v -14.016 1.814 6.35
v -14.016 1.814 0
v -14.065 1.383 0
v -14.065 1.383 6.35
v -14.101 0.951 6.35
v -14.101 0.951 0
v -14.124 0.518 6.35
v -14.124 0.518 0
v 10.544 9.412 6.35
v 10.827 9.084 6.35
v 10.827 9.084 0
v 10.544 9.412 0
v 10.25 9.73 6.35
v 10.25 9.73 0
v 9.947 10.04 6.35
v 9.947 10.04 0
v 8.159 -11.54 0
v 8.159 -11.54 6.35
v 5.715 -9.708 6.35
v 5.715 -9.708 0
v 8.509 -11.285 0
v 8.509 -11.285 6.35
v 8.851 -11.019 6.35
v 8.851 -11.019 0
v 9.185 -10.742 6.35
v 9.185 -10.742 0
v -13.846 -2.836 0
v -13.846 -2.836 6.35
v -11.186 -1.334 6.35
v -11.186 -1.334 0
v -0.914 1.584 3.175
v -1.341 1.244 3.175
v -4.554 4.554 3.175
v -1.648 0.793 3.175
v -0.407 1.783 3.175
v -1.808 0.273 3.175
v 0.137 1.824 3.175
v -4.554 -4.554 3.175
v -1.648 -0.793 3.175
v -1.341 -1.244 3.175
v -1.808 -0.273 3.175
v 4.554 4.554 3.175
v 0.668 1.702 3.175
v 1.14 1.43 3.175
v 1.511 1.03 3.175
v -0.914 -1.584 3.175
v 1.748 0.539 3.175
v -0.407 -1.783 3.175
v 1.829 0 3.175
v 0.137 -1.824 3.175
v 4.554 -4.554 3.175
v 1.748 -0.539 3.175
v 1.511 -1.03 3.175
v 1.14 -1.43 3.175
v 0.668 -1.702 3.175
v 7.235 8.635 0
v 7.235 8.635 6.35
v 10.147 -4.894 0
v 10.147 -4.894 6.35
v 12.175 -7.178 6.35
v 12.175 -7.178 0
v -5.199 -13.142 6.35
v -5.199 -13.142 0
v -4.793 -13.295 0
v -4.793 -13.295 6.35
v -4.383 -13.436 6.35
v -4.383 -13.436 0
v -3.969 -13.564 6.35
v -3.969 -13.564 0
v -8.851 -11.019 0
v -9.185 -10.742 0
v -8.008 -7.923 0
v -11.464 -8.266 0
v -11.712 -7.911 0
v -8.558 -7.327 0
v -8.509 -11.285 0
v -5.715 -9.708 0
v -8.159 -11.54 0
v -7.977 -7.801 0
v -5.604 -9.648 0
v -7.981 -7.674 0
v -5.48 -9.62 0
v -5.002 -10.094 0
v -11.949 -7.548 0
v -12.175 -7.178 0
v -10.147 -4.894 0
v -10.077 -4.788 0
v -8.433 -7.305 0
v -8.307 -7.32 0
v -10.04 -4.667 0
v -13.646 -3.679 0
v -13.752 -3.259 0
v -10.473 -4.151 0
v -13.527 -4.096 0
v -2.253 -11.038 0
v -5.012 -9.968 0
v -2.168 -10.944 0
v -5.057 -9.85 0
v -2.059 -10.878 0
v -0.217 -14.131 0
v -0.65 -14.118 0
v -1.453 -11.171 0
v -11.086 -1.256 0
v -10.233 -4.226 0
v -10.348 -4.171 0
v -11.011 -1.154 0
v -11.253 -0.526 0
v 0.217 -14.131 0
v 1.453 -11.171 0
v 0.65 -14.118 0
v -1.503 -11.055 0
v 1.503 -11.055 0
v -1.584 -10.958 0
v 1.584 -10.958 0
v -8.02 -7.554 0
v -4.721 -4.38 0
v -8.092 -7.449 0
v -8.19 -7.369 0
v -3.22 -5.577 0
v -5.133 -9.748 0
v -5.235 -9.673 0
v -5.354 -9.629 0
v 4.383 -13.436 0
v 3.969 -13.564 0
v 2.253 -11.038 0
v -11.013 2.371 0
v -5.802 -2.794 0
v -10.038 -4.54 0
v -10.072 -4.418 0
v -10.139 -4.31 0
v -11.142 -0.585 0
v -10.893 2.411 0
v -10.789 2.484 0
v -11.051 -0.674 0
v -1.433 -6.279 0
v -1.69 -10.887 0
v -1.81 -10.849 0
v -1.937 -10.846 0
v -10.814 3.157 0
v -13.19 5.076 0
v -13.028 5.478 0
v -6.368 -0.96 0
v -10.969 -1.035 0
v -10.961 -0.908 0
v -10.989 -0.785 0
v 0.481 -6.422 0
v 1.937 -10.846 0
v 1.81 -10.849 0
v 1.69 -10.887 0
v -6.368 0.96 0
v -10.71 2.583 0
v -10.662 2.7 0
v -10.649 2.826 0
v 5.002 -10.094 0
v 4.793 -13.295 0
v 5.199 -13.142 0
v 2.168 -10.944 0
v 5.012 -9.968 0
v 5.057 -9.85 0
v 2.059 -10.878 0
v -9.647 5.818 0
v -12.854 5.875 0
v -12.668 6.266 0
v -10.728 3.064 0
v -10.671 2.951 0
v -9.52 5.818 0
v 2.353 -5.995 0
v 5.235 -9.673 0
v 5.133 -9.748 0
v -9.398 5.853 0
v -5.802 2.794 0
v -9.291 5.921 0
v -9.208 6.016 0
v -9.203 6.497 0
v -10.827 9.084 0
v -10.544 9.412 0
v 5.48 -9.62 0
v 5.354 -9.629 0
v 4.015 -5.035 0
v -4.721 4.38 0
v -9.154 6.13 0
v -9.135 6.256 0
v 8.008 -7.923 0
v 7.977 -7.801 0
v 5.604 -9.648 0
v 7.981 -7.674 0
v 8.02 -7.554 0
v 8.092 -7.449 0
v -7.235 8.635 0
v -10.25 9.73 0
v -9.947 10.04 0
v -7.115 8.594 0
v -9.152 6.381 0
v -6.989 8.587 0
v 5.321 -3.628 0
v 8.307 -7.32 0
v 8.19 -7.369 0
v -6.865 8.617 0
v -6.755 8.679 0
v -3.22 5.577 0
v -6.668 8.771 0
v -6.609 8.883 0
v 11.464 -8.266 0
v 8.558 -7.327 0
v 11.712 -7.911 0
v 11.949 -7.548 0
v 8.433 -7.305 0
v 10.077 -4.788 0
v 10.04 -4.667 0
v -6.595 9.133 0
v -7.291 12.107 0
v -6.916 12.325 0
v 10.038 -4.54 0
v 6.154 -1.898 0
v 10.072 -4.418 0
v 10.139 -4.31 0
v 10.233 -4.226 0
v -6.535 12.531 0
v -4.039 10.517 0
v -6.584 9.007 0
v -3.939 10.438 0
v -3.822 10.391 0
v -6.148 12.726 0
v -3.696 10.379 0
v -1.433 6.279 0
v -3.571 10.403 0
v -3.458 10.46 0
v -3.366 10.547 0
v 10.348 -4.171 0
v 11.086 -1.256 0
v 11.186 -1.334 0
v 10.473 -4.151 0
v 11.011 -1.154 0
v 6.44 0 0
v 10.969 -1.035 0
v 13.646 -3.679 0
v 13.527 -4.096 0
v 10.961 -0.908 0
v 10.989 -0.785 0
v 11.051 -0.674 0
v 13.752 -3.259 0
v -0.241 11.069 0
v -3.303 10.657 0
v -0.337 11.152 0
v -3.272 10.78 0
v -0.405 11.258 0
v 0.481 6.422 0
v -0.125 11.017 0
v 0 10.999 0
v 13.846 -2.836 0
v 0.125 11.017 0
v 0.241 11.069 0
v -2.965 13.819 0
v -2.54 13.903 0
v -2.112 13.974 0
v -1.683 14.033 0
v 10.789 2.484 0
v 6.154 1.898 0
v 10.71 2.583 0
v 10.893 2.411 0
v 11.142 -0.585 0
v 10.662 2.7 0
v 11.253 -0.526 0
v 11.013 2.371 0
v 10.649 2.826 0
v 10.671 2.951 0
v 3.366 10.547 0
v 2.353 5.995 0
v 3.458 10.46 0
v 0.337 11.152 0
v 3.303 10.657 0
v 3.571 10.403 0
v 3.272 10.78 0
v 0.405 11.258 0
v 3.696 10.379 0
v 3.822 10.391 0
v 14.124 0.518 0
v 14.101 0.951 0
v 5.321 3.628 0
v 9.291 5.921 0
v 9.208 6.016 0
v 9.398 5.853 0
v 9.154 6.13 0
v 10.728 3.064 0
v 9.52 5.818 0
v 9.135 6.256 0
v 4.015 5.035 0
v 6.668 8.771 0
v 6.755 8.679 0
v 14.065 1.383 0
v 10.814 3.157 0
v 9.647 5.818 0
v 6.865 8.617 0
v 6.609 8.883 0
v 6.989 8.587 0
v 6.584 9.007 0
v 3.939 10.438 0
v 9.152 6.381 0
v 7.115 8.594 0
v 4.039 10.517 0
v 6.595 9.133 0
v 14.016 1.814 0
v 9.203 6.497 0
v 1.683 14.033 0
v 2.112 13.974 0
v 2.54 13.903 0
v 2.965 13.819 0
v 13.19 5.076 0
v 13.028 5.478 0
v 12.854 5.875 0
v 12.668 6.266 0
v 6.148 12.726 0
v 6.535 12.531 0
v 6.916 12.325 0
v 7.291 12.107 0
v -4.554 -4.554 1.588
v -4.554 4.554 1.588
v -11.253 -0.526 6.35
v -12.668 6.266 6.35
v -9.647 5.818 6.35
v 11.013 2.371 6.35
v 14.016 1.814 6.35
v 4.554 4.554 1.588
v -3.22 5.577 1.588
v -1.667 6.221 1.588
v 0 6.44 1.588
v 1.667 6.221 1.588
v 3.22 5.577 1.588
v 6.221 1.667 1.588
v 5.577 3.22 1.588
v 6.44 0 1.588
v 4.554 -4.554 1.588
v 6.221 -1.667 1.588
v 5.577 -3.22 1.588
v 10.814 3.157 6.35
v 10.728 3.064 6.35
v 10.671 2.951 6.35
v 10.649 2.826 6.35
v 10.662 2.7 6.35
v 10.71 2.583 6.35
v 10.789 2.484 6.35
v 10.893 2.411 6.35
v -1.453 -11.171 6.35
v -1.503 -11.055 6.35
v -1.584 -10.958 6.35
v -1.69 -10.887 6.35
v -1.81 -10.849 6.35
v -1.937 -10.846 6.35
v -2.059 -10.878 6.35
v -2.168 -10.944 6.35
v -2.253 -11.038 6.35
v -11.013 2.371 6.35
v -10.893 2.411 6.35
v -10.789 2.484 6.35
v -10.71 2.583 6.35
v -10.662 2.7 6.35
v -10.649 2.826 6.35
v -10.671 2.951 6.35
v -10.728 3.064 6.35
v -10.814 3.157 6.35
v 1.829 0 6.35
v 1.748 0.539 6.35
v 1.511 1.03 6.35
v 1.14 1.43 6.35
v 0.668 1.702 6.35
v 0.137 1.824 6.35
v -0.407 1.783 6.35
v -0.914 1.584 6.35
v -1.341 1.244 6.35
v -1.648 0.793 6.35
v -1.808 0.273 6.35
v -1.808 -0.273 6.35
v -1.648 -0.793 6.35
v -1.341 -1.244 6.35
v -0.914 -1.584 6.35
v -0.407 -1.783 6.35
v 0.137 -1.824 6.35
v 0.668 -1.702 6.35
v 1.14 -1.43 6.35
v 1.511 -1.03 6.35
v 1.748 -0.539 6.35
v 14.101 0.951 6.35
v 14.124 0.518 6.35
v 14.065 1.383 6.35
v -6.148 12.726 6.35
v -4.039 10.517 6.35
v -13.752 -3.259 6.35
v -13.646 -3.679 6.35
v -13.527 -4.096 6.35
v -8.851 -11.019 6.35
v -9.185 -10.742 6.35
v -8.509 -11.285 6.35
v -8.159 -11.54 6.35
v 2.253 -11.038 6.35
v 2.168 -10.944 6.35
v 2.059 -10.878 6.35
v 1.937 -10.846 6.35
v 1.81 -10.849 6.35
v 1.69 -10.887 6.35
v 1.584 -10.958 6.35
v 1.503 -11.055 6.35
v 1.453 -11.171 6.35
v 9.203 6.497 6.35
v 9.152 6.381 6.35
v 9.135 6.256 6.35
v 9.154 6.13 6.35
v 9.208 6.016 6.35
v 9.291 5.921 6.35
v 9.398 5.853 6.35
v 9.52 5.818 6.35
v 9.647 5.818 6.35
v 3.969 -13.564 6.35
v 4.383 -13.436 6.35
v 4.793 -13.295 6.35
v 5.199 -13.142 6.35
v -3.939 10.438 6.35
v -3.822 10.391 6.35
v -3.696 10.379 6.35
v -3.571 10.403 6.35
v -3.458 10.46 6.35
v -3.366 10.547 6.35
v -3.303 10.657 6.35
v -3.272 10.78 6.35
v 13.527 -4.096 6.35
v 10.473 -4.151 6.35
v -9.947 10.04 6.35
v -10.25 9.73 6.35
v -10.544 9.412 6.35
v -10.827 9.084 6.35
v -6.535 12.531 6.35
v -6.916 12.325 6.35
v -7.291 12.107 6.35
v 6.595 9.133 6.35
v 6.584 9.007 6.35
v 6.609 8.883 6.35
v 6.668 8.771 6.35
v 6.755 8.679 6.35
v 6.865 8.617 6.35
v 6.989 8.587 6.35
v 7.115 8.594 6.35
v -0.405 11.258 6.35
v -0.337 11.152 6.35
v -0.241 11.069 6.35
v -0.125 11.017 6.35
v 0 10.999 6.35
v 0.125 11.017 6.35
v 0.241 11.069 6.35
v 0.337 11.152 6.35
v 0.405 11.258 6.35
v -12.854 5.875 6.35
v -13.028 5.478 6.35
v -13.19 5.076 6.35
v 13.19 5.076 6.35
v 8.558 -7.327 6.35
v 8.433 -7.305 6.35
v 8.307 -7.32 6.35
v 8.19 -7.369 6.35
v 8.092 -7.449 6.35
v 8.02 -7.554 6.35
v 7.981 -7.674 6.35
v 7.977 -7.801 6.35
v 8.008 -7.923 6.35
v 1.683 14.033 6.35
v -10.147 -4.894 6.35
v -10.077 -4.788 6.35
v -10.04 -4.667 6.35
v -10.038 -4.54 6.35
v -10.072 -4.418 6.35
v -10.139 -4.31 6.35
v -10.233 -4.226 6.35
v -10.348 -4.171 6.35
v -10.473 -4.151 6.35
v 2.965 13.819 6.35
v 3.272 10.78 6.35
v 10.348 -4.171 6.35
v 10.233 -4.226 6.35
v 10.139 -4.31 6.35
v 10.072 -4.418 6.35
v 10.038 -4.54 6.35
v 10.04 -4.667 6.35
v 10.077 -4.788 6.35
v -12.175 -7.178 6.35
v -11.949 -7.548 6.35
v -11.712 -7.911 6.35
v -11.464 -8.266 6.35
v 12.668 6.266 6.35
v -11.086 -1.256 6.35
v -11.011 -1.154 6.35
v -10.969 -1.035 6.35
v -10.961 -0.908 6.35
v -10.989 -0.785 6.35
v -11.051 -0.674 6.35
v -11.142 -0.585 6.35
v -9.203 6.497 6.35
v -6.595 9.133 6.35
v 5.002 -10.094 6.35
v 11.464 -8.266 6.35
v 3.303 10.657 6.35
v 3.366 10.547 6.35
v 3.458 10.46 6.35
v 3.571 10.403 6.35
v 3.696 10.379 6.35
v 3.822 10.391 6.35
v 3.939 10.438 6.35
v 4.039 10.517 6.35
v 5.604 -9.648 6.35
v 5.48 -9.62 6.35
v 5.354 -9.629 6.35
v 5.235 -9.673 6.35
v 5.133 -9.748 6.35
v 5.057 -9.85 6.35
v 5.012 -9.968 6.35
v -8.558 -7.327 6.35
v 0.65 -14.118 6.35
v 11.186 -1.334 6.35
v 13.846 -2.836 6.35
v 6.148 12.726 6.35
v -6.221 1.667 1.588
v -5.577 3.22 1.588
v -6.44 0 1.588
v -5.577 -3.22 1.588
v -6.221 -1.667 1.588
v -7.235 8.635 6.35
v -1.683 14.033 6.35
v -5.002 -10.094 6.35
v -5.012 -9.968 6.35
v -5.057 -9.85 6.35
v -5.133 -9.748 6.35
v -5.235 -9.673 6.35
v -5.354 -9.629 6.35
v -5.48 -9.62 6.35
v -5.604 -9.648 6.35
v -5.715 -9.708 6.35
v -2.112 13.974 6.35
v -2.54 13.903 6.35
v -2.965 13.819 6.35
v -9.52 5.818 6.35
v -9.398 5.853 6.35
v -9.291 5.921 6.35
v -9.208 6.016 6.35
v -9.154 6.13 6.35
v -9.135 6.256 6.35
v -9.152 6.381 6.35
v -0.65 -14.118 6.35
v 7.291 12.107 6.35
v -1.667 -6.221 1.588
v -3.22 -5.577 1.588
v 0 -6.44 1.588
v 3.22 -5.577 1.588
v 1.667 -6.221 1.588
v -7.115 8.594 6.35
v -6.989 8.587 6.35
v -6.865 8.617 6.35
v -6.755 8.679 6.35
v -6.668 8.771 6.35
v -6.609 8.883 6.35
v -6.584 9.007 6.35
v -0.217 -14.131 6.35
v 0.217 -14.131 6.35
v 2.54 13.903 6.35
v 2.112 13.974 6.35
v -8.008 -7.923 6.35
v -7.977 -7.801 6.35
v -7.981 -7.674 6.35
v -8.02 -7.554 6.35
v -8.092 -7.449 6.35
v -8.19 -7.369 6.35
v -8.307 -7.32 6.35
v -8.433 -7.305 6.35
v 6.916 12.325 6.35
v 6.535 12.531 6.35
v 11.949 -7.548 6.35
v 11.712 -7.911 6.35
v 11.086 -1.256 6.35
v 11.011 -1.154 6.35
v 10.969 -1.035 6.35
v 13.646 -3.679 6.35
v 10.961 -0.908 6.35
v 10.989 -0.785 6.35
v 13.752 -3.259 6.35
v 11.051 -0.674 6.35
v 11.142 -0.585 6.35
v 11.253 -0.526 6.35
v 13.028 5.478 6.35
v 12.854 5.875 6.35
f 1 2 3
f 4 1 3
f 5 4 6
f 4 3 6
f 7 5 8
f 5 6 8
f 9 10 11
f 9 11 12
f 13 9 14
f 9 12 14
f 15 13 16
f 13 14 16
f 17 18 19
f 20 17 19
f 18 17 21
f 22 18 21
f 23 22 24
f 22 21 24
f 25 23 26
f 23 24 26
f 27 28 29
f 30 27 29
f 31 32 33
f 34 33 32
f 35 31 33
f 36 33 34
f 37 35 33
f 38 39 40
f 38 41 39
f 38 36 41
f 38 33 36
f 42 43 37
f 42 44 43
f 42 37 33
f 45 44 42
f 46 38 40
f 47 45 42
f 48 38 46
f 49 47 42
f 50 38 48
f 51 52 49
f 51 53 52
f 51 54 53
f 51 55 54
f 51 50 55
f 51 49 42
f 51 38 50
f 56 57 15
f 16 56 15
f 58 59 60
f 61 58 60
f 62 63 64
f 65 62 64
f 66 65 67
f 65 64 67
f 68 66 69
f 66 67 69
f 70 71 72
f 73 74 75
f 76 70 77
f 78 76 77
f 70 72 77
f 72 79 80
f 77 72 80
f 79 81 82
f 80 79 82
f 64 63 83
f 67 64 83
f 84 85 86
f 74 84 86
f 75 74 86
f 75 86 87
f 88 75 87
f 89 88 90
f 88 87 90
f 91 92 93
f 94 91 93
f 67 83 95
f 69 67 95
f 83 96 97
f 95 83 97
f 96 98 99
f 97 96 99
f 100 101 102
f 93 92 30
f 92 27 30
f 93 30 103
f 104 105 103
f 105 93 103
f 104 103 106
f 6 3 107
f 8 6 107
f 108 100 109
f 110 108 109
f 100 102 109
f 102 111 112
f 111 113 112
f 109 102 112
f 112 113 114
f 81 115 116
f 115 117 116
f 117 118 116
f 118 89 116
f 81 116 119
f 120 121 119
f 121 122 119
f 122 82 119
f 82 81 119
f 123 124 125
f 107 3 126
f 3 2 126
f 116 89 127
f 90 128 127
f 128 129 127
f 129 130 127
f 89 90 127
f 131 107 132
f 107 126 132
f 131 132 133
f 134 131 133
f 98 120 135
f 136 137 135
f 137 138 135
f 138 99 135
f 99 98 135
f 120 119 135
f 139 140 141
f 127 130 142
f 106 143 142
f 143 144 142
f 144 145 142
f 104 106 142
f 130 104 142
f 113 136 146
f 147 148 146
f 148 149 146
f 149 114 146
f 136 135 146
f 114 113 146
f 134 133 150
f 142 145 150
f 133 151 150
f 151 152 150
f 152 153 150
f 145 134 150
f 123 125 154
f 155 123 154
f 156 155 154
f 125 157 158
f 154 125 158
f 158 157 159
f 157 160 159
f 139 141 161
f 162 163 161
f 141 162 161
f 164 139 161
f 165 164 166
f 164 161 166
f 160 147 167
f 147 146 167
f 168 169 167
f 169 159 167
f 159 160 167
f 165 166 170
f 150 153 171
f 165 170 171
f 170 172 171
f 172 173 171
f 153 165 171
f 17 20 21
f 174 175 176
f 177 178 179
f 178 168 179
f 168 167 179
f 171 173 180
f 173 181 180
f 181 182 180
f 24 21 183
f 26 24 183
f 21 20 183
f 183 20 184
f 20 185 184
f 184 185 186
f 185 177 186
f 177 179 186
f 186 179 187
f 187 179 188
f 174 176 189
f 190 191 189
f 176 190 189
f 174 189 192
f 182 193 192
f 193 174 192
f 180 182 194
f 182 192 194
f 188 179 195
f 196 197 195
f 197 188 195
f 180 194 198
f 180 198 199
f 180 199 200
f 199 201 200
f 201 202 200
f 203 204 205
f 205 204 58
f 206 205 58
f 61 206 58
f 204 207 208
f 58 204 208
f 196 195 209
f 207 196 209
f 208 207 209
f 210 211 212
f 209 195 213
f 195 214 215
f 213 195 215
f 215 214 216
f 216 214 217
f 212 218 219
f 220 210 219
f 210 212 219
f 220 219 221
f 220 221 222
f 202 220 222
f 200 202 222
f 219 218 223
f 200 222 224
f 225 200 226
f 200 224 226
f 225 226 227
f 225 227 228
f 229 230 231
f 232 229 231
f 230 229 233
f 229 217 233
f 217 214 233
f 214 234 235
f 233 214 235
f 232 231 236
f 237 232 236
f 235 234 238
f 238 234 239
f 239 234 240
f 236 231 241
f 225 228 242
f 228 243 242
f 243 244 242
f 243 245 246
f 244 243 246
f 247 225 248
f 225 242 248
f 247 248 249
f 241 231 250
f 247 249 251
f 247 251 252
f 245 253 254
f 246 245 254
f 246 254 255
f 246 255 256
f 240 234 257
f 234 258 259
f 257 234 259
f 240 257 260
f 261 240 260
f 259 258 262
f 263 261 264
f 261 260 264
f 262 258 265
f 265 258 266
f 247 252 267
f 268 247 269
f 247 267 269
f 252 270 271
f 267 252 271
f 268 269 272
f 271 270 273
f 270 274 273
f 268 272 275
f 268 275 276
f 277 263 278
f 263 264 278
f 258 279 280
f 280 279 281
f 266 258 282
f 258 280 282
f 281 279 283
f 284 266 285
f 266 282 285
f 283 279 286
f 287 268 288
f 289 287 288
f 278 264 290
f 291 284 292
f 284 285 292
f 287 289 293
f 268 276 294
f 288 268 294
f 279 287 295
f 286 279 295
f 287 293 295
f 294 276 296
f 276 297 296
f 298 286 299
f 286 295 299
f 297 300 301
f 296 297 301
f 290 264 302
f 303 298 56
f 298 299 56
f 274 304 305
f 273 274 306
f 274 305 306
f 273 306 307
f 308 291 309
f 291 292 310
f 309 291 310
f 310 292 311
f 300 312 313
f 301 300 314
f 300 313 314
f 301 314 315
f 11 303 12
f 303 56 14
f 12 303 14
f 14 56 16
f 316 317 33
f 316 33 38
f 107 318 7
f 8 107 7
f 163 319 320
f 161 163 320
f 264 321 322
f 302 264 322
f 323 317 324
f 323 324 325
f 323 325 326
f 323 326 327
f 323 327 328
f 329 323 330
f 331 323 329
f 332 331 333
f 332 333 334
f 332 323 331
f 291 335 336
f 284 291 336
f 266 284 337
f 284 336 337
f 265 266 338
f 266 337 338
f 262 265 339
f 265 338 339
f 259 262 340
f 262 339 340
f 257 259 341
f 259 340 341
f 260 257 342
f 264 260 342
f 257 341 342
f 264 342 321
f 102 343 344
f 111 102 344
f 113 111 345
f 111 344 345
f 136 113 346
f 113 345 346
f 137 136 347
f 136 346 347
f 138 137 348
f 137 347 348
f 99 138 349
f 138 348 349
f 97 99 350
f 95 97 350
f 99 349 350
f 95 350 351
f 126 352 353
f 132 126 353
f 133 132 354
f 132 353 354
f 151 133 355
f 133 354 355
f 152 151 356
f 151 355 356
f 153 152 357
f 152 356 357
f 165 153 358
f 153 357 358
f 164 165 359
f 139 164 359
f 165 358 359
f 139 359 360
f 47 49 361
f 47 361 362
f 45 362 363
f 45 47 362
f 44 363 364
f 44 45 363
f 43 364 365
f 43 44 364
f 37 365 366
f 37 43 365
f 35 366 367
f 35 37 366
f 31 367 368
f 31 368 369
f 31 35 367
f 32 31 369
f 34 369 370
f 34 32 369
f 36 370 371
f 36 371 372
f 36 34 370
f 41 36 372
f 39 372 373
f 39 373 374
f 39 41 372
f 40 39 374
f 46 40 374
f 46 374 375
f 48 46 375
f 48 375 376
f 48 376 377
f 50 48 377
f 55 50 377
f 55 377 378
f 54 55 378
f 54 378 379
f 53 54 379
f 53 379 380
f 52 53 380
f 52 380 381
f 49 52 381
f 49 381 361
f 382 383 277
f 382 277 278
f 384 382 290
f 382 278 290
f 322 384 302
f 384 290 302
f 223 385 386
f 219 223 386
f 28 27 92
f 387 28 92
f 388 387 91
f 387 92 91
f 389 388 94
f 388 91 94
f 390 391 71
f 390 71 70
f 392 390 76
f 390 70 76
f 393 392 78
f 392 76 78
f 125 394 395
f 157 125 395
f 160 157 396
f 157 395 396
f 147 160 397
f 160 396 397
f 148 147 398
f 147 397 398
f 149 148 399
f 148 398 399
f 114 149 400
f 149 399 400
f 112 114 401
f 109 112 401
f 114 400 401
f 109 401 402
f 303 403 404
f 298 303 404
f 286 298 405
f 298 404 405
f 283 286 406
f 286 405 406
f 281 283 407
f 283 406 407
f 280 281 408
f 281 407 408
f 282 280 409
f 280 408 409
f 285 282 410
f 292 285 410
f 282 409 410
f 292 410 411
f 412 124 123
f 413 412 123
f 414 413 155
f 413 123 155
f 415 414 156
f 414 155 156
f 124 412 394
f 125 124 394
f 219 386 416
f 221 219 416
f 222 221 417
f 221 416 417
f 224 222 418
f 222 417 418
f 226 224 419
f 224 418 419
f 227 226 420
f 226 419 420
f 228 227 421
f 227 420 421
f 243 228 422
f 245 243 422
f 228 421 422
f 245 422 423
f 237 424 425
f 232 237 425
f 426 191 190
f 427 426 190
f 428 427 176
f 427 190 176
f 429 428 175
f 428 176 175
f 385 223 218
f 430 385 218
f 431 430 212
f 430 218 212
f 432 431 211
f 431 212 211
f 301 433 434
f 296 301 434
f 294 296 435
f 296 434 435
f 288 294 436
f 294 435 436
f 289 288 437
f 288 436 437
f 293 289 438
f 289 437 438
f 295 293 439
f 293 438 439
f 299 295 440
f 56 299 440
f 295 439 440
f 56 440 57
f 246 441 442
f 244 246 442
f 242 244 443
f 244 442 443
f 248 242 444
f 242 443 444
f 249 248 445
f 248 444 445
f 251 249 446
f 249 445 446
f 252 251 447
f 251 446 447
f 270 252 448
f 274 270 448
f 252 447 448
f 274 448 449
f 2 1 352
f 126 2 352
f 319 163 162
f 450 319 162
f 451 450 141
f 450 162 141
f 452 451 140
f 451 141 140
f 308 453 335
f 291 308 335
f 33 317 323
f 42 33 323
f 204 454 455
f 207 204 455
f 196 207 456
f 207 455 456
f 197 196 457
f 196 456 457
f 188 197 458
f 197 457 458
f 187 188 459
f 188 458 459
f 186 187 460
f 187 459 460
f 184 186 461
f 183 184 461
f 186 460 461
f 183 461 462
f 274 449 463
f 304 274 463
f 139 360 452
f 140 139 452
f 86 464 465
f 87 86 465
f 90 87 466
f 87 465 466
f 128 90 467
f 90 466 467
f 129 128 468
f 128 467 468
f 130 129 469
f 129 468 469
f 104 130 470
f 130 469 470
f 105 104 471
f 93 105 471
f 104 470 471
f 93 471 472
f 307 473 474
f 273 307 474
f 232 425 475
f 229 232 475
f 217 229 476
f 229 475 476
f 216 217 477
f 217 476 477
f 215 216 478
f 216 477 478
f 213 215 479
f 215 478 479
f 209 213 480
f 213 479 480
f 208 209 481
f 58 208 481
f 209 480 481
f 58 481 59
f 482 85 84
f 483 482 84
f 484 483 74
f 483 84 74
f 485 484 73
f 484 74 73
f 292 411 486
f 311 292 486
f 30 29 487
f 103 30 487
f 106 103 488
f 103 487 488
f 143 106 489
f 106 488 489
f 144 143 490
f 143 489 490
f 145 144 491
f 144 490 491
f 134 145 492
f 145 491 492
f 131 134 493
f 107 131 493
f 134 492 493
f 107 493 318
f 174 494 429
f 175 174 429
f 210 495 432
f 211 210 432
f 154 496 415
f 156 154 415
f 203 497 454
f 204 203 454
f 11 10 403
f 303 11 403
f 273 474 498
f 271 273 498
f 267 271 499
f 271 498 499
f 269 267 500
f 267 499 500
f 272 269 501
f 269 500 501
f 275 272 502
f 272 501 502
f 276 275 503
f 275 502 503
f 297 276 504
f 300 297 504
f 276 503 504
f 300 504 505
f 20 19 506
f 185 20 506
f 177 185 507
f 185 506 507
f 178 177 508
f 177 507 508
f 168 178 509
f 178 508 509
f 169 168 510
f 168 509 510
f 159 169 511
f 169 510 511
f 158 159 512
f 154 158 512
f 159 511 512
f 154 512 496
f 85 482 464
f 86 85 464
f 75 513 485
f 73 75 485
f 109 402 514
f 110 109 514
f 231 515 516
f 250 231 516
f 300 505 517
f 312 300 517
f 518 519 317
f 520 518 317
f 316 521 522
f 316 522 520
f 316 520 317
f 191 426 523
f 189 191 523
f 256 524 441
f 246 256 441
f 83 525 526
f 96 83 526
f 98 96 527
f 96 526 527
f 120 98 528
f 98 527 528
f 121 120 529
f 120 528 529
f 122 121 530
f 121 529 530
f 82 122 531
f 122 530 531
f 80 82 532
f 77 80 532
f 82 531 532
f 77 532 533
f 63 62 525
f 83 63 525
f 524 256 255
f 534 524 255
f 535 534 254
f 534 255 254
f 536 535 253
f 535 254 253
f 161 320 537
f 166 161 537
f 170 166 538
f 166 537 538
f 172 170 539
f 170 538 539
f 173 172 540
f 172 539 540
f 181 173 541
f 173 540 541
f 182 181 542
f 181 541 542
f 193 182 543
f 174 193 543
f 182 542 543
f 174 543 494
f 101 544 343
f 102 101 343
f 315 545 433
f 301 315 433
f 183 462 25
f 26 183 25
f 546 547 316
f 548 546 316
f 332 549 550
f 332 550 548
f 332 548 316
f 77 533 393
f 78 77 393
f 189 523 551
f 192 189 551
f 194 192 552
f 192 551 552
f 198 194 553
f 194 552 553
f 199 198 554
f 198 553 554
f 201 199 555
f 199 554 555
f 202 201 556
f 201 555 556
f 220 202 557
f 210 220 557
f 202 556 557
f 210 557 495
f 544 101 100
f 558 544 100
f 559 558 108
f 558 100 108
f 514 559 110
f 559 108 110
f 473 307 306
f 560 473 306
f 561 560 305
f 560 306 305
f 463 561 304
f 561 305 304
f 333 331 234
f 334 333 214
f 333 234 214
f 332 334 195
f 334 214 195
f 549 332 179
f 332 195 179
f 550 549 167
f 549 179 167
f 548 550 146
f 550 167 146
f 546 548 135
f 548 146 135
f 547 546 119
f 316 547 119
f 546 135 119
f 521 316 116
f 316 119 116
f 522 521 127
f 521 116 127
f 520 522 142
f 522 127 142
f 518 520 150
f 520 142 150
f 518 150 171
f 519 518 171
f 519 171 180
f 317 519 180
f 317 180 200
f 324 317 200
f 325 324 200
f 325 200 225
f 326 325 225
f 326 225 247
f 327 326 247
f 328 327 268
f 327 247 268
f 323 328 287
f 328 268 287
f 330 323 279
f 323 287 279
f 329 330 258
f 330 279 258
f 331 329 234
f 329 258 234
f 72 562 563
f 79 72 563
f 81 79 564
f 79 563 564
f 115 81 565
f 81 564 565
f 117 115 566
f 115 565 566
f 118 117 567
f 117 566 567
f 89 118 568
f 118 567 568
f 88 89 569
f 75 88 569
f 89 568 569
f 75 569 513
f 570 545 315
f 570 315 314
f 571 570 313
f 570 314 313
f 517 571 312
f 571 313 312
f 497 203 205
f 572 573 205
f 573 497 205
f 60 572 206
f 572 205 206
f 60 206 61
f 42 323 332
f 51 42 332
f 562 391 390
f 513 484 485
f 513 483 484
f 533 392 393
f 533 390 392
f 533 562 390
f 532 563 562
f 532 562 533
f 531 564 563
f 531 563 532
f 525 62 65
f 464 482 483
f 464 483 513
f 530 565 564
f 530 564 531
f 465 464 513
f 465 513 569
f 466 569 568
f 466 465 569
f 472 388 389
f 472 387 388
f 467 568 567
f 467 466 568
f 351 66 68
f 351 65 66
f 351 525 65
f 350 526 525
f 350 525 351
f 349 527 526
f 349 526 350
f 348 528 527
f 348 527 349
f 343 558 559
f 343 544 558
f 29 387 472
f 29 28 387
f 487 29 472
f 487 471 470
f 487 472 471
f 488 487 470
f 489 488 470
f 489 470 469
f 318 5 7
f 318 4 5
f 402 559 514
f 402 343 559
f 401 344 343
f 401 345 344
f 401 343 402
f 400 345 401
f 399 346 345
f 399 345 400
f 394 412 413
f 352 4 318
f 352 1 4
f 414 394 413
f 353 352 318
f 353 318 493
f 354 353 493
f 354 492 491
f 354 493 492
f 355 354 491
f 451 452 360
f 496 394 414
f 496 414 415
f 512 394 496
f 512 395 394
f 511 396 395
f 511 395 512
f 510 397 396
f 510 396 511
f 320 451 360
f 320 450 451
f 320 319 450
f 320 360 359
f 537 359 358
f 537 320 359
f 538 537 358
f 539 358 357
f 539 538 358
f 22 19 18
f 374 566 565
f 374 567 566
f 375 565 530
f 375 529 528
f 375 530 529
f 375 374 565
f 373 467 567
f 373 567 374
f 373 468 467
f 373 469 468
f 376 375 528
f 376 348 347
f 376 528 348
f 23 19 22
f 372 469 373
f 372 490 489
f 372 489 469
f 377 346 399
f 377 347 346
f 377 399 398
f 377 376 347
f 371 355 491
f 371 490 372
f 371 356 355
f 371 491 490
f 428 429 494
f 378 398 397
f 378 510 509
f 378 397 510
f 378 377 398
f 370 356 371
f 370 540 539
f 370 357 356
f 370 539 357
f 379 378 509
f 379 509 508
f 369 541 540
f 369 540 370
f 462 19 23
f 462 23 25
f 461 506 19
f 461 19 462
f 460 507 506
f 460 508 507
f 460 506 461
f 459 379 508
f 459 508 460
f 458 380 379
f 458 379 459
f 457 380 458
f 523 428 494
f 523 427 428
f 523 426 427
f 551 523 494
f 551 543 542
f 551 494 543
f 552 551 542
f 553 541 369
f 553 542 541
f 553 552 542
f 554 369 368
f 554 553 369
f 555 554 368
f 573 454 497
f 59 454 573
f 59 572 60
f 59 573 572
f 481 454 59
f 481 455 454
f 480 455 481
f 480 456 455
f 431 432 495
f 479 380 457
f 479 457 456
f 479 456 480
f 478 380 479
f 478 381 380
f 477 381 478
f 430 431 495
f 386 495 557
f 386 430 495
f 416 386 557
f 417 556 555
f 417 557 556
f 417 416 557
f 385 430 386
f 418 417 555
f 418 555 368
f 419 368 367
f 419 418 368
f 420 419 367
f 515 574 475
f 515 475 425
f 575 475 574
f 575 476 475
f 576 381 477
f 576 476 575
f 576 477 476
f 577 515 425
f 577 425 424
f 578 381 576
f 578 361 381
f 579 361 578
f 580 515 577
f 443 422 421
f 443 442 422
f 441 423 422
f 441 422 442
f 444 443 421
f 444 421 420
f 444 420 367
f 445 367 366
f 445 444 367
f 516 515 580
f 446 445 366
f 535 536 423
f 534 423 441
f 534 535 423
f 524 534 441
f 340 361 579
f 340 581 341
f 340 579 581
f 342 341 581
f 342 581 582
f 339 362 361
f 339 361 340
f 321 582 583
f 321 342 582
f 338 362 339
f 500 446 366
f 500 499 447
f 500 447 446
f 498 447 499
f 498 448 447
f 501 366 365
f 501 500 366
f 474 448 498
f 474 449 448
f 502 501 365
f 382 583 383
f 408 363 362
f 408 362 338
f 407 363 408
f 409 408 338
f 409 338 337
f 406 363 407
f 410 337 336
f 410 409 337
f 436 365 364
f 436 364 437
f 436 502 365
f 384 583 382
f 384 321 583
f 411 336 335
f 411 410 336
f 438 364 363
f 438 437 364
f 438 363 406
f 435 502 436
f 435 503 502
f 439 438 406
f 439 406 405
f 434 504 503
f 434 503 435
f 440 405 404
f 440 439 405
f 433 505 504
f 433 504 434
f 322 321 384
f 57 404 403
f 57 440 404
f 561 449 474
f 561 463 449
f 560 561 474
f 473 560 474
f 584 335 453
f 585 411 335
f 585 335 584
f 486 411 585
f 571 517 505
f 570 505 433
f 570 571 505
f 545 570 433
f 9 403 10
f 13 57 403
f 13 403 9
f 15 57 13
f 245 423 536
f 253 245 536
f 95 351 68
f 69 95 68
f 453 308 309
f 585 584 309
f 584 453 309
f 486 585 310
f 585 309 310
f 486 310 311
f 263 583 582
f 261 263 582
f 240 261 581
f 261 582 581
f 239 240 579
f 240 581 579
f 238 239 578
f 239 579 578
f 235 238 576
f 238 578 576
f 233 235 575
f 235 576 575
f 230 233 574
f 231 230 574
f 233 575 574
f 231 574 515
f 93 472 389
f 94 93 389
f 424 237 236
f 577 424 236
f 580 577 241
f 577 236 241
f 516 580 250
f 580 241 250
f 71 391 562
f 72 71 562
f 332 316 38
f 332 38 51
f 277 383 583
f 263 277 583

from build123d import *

# Parameters (mm, degrees)
F0_R            = 14.1331511128
F0_R_2          = 1.8288
F1_DEPTH        = 6.35
F2_W            = 9.1077039159
F2_H            = 9.1077039159
F3_DEPTH        = 3.175
F4_R            = 6.4401192
F5_DEPTH        = 1.5875
F7_DEPTH        = 6.35
F7_COPIES_COUNT = 19


# Not quite as in the source:
# - a pattern or mirror of a feature is missing from the dataset's text; its kind, count and spacing are read off the source's solid


with BuildPart() as f1:
    # F0 (on Top) → F1 (new body)
    with BuildSketch(Plane.XY):
        Circle(F0_R)
        Circle(F0_R_2, mode=Mode.SUBTRACT)
    extrude(amount=F1_DEPTH)

    # F2 (on face) → F3 (cut)
    with BuildSketch(Plane(origin=(0, 0, 0), x_dir=(1, 0, 0), z_dir=(0, 0, -1))):
        Rectangle(F2_W, F2_H)
    extrude(amount=-F3_DEPTH, mode=Mode.SUBTRACT)

    # F4 (on face) → F5 (cut)
    with BuildSketch(Plane(origin=(0, 0, 0), x_dir=(1, 0, 0), z_dir=(0, 0, -1))):
        Circle(F4_R)
    extrude(amount=-F5_DEPTH, mode=Mode.SUBTRACT)

    # F6 (on face) → F7 (cut, through all)
    with BuildSketch(Plane.XY.offset(6.35)):
        with BuildLine():
            Line((0.4054121916, 11.2582715851), (1.6826301613, 14.0326304063))
            ThreePointArc((1.6826301613, 14.0326304063), (0, 14.1331511128), (-1.6826301613, 14.0326304063))
            Line((-1.6826301613, 14.0326304063), (-0.4054121916, 11.2582715851))
            ThreePointArc((-0.4054121916, 11.2582715851), (0, 10.9985991732), (0.4054121916, 11.2582715851))
        make_face()
    f7 = extrude(amount=-F7_DEPTH, mode=Mode.SUBTRACT)

    # F7_copies: F7 ×19 about axis
    f7_copies_axis = Axis((0, 0, 0), (0, 0, 1))
    for i in range(1, F7_COPIES_COUNT):
        add(f7.rotate(f7_copies_axis, i * 360 / F7_COPIES_COUNT), mode=Mode.SUBTRACT)


solid = f1.part
